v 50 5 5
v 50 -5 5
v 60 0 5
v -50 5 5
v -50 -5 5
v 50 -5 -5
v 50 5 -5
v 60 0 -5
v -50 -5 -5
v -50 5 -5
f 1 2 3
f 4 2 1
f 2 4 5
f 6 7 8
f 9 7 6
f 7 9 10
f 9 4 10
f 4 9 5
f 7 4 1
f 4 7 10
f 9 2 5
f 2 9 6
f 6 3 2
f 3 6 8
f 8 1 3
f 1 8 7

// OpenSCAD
$fn=64;

module wedge_block() {
    difference() {
        union() {
            // Main prismatic body
            translate([-50, -5, -5])
                cube([100, 10, 10]);
            // Wedge end
            translate([50, -5, -5])
                linear_extrude(height=10)
                    polygon(points=[[0, 0], [10, 5], [0, 10]]);
        }
        // U-shaped clevis/handle cutout
        translate([-50, -2.5, -2.5])
            cube([10, 5, 5]);
    }
}

module clevis_handle() {
    difference() {
        // U-shaped clevis
        translate([-50, -5, -5])
            cube([10, 10, 10]);
        // Arched cutout
        translate([-50, -5, -5])
            cylinder(h=10, r=2.5, center=true);
    }
}

module wedge_with_clevis() {
    union() {
        wedge_block();
        clevis_handle();
    }
}

wedge_with_clevis();
